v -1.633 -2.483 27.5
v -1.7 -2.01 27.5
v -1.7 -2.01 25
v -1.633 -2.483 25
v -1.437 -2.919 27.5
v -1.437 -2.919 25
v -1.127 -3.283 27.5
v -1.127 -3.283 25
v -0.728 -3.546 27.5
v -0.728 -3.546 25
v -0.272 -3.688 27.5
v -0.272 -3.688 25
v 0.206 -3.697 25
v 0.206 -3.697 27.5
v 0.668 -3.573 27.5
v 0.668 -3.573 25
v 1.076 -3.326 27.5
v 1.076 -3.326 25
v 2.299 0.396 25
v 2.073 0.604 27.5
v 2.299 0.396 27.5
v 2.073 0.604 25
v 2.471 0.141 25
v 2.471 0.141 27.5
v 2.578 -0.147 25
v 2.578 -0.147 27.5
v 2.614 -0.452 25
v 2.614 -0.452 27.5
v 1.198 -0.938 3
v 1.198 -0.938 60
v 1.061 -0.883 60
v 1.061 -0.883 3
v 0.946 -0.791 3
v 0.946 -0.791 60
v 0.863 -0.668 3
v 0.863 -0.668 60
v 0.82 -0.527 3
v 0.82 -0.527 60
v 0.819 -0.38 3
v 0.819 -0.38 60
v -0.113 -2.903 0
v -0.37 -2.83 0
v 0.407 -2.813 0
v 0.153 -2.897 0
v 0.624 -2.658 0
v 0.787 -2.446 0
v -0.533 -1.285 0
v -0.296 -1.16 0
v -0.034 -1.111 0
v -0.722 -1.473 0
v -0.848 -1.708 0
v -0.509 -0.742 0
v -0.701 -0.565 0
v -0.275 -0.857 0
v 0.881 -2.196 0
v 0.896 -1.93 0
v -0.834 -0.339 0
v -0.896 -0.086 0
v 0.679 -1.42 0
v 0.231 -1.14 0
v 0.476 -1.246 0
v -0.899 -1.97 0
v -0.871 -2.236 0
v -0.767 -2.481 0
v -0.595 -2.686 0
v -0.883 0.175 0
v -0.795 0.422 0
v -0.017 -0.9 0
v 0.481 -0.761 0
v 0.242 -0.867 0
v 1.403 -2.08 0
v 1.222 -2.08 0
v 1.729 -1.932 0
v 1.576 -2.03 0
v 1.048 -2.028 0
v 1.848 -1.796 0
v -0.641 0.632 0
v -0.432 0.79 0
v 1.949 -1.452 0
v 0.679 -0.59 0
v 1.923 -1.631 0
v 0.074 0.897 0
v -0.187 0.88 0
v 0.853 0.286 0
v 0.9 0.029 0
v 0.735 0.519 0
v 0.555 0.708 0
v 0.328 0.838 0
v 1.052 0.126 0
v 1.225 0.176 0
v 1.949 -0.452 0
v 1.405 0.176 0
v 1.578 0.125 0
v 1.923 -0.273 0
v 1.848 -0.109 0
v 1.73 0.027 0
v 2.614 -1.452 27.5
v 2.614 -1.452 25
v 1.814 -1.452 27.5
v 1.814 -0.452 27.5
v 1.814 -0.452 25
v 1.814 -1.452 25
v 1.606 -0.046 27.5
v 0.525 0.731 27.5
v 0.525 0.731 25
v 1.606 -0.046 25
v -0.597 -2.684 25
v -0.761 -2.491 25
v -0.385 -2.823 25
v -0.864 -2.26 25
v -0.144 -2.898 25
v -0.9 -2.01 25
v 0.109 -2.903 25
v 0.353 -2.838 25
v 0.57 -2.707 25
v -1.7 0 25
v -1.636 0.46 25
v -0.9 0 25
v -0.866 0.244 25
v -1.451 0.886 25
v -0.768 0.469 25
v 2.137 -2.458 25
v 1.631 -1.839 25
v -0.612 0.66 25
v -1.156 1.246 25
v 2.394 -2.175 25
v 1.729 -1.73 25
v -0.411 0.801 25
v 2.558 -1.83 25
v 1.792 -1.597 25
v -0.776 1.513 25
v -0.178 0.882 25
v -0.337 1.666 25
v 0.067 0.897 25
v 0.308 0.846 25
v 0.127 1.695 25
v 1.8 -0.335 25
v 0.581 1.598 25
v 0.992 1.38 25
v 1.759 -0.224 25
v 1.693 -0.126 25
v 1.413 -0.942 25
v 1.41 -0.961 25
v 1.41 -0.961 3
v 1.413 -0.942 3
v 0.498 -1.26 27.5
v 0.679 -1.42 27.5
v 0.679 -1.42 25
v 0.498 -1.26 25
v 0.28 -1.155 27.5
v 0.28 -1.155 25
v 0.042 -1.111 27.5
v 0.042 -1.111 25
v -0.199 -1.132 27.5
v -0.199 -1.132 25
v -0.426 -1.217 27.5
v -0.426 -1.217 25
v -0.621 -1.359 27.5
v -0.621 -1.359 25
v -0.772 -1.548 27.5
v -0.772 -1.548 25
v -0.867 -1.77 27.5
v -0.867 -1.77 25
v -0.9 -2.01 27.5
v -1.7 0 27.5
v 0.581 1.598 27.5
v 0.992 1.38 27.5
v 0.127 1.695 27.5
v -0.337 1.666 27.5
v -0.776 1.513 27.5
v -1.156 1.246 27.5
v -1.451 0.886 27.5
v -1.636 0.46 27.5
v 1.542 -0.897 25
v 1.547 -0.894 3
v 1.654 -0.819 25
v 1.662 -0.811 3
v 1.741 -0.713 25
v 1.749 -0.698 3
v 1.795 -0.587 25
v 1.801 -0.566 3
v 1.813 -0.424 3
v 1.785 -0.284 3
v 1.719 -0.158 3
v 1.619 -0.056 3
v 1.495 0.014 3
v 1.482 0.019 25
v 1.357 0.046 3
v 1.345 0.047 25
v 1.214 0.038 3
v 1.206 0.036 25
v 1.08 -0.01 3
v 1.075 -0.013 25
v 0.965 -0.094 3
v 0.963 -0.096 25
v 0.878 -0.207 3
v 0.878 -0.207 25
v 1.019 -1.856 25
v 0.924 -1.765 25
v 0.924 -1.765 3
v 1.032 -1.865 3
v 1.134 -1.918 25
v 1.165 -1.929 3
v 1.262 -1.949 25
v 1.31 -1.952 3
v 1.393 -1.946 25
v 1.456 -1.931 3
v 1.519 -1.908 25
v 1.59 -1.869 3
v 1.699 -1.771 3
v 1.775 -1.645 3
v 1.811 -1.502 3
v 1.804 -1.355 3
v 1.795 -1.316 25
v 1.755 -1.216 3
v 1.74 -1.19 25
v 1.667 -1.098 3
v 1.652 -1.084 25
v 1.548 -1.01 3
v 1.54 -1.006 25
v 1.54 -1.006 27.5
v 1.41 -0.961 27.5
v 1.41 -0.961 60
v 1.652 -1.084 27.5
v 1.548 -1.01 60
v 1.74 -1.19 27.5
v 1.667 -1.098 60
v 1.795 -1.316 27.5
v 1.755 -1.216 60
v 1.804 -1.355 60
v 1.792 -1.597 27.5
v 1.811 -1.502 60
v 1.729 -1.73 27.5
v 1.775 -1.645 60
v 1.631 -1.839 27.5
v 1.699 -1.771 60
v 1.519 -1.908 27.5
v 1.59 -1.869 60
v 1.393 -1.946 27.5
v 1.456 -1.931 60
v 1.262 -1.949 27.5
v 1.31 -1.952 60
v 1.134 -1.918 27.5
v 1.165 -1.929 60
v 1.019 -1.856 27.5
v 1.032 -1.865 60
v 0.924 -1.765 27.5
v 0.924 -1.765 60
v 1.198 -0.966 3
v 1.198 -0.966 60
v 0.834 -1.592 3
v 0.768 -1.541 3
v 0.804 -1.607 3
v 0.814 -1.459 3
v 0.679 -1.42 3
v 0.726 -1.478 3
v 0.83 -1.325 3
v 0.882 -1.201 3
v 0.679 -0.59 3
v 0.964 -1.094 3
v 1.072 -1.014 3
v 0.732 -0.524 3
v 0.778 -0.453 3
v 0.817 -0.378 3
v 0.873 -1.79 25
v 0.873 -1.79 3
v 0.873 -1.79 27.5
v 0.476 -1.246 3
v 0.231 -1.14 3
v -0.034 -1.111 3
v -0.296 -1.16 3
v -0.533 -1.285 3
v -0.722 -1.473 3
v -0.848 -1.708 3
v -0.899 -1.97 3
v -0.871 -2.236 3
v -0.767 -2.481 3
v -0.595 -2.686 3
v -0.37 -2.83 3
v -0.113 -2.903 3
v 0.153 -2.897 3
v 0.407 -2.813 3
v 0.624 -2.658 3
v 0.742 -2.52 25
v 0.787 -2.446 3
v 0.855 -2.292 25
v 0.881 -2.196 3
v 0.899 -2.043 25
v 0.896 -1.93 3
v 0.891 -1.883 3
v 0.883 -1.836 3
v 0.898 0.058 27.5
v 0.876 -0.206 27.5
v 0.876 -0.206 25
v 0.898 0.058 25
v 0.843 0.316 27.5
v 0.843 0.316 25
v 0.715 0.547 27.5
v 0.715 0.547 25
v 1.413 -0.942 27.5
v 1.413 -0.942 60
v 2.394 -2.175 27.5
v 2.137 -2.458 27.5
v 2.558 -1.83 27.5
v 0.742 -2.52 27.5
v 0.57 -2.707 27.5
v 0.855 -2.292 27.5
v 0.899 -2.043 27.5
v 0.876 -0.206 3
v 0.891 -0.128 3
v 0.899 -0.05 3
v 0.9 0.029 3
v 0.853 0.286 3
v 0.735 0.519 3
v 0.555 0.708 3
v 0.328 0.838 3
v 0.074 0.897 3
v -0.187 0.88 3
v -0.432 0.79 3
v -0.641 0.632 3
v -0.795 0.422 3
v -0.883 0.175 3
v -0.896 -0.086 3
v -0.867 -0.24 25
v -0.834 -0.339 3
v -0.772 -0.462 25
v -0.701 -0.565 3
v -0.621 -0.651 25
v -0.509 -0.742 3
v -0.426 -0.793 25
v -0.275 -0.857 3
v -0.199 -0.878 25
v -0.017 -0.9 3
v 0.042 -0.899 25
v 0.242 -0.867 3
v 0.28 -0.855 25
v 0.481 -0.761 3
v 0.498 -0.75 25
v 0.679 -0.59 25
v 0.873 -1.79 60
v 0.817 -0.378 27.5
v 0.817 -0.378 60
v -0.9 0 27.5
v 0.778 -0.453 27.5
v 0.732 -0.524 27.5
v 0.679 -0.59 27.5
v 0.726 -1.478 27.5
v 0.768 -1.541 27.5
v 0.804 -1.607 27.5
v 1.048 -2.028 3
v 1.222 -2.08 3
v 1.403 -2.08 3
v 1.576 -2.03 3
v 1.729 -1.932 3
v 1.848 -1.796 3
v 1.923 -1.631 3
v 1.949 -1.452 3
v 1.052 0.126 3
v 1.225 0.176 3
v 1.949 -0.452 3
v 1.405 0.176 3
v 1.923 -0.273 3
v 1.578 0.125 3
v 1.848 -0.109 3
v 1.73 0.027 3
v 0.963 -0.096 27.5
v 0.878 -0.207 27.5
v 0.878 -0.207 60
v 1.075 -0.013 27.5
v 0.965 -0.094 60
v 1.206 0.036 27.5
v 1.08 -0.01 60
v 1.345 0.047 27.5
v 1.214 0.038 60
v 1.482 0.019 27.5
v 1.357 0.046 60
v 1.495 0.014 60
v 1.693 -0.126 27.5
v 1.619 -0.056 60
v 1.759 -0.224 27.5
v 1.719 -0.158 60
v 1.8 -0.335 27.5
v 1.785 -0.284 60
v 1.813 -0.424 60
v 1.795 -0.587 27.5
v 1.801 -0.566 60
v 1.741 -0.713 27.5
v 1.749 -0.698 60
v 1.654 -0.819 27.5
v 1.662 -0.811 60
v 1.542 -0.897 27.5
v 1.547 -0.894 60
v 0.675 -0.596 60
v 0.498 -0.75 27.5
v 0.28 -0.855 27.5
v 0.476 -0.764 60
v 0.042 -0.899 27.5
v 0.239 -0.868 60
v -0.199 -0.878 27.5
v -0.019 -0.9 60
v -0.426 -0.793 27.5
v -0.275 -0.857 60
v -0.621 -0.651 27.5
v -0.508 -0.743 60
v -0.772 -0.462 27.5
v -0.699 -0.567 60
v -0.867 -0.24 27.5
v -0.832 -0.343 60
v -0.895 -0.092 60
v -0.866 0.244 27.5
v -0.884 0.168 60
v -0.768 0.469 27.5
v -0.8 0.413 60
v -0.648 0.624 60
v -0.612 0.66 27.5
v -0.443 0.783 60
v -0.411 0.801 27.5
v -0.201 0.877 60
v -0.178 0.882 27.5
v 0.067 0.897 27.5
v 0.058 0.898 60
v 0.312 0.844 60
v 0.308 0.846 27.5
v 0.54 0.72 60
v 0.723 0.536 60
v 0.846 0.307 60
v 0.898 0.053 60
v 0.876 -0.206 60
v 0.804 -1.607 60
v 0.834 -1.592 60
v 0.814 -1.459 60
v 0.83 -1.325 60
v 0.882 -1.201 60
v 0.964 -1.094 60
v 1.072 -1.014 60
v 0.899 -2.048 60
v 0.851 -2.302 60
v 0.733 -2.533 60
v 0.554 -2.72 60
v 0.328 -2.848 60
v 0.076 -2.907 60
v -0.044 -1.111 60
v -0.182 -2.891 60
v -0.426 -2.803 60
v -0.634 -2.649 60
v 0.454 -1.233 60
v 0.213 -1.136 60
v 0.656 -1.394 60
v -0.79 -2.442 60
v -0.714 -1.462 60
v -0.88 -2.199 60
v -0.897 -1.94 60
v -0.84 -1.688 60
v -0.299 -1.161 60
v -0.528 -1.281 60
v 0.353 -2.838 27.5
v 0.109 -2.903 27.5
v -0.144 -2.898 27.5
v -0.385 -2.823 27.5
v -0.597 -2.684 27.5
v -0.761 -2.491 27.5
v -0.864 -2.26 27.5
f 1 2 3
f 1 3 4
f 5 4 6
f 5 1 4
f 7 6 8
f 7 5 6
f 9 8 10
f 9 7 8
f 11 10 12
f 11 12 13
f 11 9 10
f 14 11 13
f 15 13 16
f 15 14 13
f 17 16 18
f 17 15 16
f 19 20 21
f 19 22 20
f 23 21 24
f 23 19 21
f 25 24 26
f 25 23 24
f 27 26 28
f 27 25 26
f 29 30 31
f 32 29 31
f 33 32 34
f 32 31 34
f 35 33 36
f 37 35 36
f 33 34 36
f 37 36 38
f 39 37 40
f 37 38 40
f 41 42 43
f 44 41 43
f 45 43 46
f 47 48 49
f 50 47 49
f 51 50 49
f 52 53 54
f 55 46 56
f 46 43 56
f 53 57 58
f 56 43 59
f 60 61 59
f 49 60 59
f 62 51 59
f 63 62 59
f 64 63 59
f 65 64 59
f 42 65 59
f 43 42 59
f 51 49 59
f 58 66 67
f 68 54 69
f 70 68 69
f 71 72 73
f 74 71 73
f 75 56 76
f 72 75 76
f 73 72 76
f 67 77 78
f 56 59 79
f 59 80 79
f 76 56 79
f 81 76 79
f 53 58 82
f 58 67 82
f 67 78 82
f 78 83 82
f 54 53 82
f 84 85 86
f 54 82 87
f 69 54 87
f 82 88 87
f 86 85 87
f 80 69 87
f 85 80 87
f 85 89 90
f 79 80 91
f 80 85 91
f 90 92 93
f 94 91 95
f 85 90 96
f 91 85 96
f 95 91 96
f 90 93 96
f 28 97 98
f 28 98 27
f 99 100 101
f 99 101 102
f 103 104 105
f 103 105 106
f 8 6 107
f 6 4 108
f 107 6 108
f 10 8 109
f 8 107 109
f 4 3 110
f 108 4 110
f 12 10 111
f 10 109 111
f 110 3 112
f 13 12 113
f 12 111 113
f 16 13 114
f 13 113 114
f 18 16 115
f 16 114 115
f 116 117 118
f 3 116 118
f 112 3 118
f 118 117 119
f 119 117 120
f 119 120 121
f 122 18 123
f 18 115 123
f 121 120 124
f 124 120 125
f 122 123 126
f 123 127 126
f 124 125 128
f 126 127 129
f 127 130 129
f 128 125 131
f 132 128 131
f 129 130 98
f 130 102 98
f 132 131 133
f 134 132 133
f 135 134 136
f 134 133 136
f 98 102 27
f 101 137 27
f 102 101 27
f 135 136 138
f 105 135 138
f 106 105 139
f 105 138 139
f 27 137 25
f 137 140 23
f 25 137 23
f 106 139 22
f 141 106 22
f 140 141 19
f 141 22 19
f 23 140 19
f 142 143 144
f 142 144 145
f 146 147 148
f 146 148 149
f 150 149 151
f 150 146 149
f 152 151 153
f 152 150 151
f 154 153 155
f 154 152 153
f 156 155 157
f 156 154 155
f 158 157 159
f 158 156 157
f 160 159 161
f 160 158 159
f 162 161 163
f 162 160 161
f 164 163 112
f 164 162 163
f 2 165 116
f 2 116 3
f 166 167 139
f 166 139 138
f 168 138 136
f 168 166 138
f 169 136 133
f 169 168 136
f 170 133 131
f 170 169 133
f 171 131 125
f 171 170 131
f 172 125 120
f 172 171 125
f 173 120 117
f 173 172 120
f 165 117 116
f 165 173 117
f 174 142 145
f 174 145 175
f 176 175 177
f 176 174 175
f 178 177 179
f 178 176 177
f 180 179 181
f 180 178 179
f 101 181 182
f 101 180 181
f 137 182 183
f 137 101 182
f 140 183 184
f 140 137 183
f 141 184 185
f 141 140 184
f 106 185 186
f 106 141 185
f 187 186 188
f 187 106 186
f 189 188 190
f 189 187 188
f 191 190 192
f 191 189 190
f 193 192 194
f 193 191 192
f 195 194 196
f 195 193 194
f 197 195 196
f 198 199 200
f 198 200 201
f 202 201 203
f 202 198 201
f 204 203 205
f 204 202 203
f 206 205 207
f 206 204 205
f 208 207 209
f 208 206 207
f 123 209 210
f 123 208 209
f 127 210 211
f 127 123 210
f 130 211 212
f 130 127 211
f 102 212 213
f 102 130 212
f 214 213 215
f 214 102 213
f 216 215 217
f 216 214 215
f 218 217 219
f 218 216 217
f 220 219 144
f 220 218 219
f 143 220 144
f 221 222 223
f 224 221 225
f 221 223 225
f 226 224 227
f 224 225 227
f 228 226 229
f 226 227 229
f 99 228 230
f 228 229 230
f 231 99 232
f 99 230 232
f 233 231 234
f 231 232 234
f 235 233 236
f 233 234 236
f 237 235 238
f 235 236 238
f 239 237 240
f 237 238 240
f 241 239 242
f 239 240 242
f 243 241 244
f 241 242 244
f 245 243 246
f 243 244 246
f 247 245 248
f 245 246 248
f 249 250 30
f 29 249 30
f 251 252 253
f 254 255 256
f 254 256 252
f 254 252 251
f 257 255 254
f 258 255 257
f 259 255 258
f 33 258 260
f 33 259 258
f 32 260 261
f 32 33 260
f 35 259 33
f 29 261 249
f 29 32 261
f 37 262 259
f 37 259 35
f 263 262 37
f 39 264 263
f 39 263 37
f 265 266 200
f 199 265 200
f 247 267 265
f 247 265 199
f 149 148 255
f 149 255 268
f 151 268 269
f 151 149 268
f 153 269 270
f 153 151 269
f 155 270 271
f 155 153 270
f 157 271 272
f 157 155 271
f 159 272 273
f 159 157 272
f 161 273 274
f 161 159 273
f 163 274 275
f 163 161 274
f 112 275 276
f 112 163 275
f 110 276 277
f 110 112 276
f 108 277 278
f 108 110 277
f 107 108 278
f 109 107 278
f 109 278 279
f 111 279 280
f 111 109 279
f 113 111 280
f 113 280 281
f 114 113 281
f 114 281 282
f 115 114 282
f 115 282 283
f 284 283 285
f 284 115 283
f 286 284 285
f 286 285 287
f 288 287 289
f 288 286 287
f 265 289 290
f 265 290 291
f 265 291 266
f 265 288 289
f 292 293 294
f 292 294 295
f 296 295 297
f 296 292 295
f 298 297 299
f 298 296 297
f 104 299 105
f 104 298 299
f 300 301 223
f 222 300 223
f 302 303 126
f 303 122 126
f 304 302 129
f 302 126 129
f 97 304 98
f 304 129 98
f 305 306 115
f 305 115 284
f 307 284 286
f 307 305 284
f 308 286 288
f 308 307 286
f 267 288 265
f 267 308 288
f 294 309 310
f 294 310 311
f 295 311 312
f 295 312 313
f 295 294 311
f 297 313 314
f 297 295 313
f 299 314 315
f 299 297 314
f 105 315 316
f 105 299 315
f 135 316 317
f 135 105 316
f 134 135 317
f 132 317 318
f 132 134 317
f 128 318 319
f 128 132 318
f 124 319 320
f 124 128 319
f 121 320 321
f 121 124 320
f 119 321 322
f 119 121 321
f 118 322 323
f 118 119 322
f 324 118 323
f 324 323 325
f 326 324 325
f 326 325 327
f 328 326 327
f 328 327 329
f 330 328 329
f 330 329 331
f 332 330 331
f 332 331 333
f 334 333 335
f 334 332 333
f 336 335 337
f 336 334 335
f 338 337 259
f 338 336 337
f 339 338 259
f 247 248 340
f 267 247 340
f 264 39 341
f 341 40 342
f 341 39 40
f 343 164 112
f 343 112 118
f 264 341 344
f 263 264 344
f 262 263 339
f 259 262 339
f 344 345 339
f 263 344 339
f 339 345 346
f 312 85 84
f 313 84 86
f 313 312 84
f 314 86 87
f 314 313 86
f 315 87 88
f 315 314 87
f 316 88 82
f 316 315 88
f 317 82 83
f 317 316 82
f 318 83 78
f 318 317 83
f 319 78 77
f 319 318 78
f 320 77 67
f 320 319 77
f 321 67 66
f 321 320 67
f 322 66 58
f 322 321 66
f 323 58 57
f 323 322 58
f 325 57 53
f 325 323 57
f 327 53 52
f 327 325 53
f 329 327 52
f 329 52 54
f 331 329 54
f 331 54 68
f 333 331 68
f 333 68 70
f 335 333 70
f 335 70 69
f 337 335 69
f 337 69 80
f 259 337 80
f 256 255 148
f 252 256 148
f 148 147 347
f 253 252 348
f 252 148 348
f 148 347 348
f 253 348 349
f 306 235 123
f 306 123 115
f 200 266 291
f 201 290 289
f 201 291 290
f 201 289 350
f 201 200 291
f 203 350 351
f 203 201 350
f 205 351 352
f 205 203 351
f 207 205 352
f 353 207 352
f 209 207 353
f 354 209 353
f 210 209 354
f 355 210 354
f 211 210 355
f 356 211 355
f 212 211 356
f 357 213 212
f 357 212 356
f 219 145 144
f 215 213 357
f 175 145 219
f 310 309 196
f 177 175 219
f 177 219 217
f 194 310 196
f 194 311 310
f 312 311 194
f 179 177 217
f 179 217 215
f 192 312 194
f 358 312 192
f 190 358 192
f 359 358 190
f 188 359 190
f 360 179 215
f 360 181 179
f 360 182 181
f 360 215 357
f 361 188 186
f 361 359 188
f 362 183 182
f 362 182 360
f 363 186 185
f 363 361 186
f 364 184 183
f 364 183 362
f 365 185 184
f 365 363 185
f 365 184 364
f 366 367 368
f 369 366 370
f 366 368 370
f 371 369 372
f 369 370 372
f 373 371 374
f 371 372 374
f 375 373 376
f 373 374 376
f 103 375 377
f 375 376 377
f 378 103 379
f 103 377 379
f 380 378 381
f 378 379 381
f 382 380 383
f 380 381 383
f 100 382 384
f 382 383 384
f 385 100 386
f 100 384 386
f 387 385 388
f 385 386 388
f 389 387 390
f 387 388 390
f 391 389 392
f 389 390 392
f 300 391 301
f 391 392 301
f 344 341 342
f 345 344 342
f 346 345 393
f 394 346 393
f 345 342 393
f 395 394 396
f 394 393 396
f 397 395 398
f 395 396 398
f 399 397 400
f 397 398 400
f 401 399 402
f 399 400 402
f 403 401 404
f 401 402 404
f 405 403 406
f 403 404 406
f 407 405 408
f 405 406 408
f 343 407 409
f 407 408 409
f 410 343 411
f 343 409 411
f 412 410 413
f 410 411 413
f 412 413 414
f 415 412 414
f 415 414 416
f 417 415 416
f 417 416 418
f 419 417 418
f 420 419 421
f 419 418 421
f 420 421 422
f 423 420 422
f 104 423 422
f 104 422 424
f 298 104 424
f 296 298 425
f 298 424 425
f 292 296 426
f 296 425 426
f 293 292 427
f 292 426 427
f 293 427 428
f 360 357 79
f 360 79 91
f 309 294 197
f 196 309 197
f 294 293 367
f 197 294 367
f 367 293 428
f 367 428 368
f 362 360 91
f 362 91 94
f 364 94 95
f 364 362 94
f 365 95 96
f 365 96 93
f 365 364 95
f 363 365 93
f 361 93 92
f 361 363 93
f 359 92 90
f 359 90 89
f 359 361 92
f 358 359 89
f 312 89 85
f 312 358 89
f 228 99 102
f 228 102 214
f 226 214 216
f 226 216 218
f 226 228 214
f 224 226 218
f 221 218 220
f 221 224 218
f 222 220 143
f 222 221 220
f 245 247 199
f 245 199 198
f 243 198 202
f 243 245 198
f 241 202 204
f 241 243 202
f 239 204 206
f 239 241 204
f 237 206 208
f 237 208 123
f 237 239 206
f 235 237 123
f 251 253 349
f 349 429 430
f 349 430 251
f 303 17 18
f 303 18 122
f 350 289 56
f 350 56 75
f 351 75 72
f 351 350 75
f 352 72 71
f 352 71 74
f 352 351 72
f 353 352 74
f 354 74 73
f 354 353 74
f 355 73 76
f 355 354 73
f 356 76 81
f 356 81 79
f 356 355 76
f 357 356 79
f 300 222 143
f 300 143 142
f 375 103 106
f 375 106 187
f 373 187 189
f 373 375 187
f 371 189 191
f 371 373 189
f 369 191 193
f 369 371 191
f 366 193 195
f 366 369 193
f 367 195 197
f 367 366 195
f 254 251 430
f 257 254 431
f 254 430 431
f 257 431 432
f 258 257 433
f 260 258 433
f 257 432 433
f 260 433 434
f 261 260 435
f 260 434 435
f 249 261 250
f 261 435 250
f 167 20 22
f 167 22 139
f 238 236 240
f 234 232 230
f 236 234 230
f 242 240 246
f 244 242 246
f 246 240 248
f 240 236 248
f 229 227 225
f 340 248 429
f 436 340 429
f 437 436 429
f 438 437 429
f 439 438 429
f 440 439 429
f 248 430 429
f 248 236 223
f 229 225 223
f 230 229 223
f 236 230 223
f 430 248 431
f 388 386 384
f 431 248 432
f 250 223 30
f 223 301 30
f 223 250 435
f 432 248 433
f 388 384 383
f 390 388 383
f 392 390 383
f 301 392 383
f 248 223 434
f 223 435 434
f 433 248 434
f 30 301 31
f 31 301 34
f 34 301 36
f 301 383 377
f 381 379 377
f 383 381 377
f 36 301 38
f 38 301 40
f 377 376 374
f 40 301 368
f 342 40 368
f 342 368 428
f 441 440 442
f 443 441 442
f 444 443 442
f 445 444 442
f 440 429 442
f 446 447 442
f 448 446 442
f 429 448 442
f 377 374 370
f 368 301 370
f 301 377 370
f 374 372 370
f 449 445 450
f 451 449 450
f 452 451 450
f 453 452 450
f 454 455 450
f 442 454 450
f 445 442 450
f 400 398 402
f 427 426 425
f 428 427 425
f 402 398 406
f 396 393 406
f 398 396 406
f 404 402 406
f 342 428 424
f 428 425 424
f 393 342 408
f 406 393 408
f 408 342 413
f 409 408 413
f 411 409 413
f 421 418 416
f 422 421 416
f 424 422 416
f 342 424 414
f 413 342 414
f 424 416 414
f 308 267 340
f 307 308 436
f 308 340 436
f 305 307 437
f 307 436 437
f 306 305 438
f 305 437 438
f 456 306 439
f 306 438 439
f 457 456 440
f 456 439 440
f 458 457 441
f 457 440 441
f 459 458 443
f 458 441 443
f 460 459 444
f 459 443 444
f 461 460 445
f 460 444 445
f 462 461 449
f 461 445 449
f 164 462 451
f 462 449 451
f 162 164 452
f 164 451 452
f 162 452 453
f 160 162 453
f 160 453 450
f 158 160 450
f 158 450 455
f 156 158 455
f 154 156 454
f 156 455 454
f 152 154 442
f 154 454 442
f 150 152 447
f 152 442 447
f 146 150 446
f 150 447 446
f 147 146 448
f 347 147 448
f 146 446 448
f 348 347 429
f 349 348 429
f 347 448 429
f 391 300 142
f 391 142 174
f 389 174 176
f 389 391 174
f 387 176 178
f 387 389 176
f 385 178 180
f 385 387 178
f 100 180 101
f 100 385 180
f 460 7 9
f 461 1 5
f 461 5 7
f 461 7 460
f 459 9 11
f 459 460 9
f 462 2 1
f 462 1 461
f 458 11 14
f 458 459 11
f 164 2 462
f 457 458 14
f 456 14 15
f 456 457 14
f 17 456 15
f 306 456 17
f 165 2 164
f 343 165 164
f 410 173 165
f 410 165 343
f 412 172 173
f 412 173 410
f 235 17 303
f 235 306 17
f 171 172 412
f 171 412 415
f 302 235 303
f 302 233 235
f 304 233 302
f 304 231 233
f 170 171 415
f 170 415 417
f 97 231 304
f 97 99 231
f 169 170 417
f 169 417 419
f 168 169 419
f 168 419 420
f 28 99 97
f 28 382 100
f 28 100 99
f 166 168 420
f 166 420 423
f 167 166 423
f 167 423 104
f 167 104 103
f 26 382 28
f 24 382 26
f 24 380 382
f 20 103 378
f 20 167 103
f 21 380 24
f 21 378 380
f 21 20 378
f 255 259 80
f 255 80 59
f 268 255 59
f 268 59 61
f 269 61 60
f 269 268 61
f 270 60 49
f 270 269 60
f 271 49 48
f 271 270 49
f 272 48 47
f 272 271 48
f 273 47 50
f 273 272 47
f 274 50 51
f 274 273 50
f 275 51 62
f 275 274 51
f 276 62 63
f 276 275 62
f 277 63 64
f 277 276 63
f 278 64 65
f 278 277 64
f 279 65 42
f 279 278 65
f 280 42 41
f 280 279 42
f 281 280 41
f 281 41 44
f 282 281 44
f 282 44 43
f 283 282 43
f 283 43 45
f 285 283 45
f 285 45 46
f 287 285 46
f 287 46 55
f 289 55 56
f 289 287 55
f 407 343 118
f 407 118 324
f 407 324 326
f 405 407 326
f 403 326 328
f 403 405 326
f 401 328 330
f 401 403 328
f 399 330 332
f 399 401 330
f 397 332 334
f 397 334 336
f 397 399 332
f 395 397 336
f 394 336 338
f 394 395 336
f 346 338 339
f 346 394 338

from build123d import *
from build123d.topology import SkipClean

# Parameters (mm, degrees)
BOSS_EXTRUDE1_DEPTH = 2.5
BOSS_EXTRUDE2_DEPTH = 22
BOSS_EXTRUDE3_DEPTH = 3
CUT_EXTRUDE1_DEPTH  = 24.5
BOSS_EXTRUDE4_START = 32.5
BOSS_EXTRUDE4_DEPTH = 32.5
FILLET1_R           = 1.3


with BuildPart() as part:
    # Sketch1 → Boss-Extrude1 (new body)
    with BuildSketch(Plane.XY.offset(27.5)):
        with BuildLine():
            Line((-1.7, 0), (-1.7, -2.01))
            ThreePointArc((-1.7, -2.01), (-0.728058535, -3.546206617), (1.076389141, -3.325821575))
            Line((1.076389141, -3.325821575), (2.613987517, -2.068011074))
            Line((2.613987517, -2.068011074), (2.613987517, 0.214645493))
            Line((2.613987517, 0.214645493), (0.99224156, 1.380382804))
            ThreePointArc((0.99224156, 1.380382804), (-0.775625344, 1.512747608), (-1.7, 0))
        make_face()
        with BuildLine():
            Line((0.679355547, -0.590318593), (0.679355547, -1.419681407))
            ThreePointArc((0.679355547, -1.419681407), (-0.315103164, -1.166963823), (-0.9, -2.01))
            Line((-0.9, -2.01), (-0.9, 0))
            ThreePointArc((-0.9, 0), (-0.315103164, -0.843036177), (0.679355547, -0.590318593))
        make_face(mode=Mode.SUBTRACT)
        with BuildLine():
            Line((1.630572559, -1.838904922), (0.569853074, -2.706611422))
            ThreePointArc((0.569853074, -2.706611422), (0.854555431, -2.292373892), (0.872712282, -1.79006075))
            Line((0.872712282, -1.79006075), (0.923994115, -1.764796557))
            ThreePointArc((0.923994115, -1.764796557), (1.261831892, -1.949170927), (1.630572559, -1.838904922))
        make_face(mode=Mode.SUBTRACT)
        with BuildLine():
            Line((0.525304355, 0.730790896), (1.60582327, -0.045903634))
            ThreePointArc((1.60582327, -0.045903634), (1.206195872, 0.036344151), (0.878343375, -0.206512796))
            Line((0.878343375, -0.206512796), (0.876200076, -0.205605026))
            ThreePointArc((0.876200076, -0.205605026), (0.842771024, 0.315811655), (0.525304355, 0.730790896))
        make_face(mode=Mode.SUBTRACT)
        with BuildLine():
            Line((1.813987517, -0.451898576), (1.813987517, -1.451898576))
            ThreePointArc((1.813987517, -1.451898576), (1.699848532, -1.133918581), (1.409542408, -0.961114242))
            Line((1.409542408, -0.961114242), (1.412543995, -0.942088969))
            ThreePointArc((1.412543995, -0.942088969), (1.700819677, -0.768696431), (1.813987517, -0.451898576))
        make_face(mode=Mode.SUBTRACT)
    extrude(amount=-BOSS_EXTRUDE1_DEPTH)

    # Sketch2 → Boss-Extrude2 (add)
    with BuildSketch(Plane(origin=(0, 0, 25), x_dir=(-1, 0, 0), z_dir=(0, 0, -1))):
        with BuildLine():
            Line((-0.872712282, -1.79006075), (-0.923994115, -1.764796557))
            ThreePointArc((-0.923994115, -1.764796557), (-1.741947592, -1.710452584), (-1.409542408, -0.961114242))
            Line((-1.409542408, -0.961114242), (-1.412543995, -0.942088968))
            ThreePointArc((-1.412543995, -0.942088968), (-1.718555312, -0.158087582), (-0.878343375, -0.206512796))
            Line((-0.878343375, -0.206512796), (-0.876200076, -0.205605026))
            ThreePointArc((-0.876200076, -0.205605026), (0.801211243, 0.40995188), (-0.679355547, -0.590318593))
            Line((-0.679355547, -0.590318593), (-0.679355547, -1.419681407))
            ThreePointArc((-0.679355547, -1.419681407), (0.797824448, -2.426504681), (-0.872712282, -1.79006075))
        make_face()
    extrude(amount=BOSS_EXTRUDE2_DEPTH)

    # Sketch3 → Boss-Extrude3 (add)
    with BuildSketch(Plane(origin=(0, 0, 3), x_dir=(-1, 0, 0), z_dir=(0, 0, -1))):
        with BuildLine():
            Line((-0.679355547, -0.590318593), (-0.679355547, -1.419681407))
            ThreePointArc((-0.679355547, -1.419681407), (0.828144816, -2.362386385), (-0.896420024, -1.929805603))
            ThreePointArc((-0.896420024, -1.929805603), (-1.576433756, -2.029721828), (-1.948619488, -1.451898576))
            Line((-1.948619488, -1.451898576), (-1.948619488, -0.451898576))
            ThreePointArc((-1.948619488, -0.451898576), (-1.578314183, 0.125066892), (-0.8995417, 0.028718114))
            ThreePointArc((-0.8995417, 0.028718114), (0.847956803, 0.301611107), (-0.679355547, -0.590318593))
        make_face()
    extrude(amount=BOSS_EXTRUDE3_DEPTH)

    # Sketch4 → Cut-Extrude1 (cut)
    with BuildSketch(Plane.XY.offset(27.5)):
        with BuildLine():
            Line((0.679355547, -0.590318593), (0.679355547, -1.419681407))
            ThreePointArc((0.679355547, -1.419681407), (0.747780209, -1.50917592), (0.804488538, -1.60651742))
            Line((0.804488538, -1.60651742), (0.833948407, -1.591764415))
            ThreePointArc((0.833948407, -1.591764415), (0.881698314, -1.200649606), (1.197901281, -0.965561259))
            Line((1.197901281, -0.965561259), (1.197901281, -0.938235893))
            ThreePointArc((1.197901281, -0.938235893), (0.900174078, -0.732537913), (0.819207563, -0.379837516))
            Line((0.819207563, -0.379837516), (0.816593613, -0.378384554))
            ThreePointArc((0.816593613, -0.378384554), (0.755443566, -0.489188122), (0.679355547, -0.590318593))
        make_face()
    extrude(amount=-CUT_EXTRUDE1_DEPTH, mode=Mode.SUBTRACT)

    # Sketch5 → Boss-Extrude4 (add)
    with SkipClean():  # the faces are left unmerged after this step: merging them gives an invalid solid
        with BuildSketch(Plane.XY.offset(27.5).offset(BOSS_EXTRUDE4_START)):
            with BuildLine():
                Line((0.923994116, -1.764796557), (0.872712282, -1.79006075))
                ThreePointArc((0.872712282, -1.79006075), (-0.84360695, -2.323571865), (0.804488538, -1.60651742))
                Line((0.804488538, -1.60651742), (0.833948407, -1.591764415))
                ThreePointArc((0.833948407, -1.591764415), (0.881698314, -1.200649606), (1.197901281, -0.965561259))
                Line((1.197901281, -0.965561259), (1.197901281, -0.938235893))
                ThreePointArc((1.197901281, -0.938235893), (0.900174078, -0.732537913), (0.819207563, -0.379837516))
                Line((0.819207563, -0.379837516), (0.816593613, -0.378384554))
                ThreePointArc((0.816593613, -0.378384554), (-0.850794223, 0.293511823), (0.876200076, -0.205605026))
                Line((0.876200076, -0.205605026), (0.878343375, -0.206512796))
                ThreePointArc((0.878343375, -0.206512796), (1.718555312, -0.158087582), (1.412543995, -0.942088968))
                Line((1.412543995, -0.942088968), (1.409542408, -0.961114242))
                ThreePointArc((1.409542408, -0.961114242), (1.741947592, -1.710452584), (0.923994116, -1.764796557))
            make_face()
        extrude(amount=-BOSS_EXTRUDE4_DEPTH)

    # Fillet1
    fillet1_edges = [part.edges().sort_by_distance(p)[0] for p in [
        (2.613987517, 0.214645493, 26.25),
        (2.613987517, -2.068011074, 26.25),
    ]]
    fillet(fillet1_edges, radius=FILLET1_R)


solid = part.part
